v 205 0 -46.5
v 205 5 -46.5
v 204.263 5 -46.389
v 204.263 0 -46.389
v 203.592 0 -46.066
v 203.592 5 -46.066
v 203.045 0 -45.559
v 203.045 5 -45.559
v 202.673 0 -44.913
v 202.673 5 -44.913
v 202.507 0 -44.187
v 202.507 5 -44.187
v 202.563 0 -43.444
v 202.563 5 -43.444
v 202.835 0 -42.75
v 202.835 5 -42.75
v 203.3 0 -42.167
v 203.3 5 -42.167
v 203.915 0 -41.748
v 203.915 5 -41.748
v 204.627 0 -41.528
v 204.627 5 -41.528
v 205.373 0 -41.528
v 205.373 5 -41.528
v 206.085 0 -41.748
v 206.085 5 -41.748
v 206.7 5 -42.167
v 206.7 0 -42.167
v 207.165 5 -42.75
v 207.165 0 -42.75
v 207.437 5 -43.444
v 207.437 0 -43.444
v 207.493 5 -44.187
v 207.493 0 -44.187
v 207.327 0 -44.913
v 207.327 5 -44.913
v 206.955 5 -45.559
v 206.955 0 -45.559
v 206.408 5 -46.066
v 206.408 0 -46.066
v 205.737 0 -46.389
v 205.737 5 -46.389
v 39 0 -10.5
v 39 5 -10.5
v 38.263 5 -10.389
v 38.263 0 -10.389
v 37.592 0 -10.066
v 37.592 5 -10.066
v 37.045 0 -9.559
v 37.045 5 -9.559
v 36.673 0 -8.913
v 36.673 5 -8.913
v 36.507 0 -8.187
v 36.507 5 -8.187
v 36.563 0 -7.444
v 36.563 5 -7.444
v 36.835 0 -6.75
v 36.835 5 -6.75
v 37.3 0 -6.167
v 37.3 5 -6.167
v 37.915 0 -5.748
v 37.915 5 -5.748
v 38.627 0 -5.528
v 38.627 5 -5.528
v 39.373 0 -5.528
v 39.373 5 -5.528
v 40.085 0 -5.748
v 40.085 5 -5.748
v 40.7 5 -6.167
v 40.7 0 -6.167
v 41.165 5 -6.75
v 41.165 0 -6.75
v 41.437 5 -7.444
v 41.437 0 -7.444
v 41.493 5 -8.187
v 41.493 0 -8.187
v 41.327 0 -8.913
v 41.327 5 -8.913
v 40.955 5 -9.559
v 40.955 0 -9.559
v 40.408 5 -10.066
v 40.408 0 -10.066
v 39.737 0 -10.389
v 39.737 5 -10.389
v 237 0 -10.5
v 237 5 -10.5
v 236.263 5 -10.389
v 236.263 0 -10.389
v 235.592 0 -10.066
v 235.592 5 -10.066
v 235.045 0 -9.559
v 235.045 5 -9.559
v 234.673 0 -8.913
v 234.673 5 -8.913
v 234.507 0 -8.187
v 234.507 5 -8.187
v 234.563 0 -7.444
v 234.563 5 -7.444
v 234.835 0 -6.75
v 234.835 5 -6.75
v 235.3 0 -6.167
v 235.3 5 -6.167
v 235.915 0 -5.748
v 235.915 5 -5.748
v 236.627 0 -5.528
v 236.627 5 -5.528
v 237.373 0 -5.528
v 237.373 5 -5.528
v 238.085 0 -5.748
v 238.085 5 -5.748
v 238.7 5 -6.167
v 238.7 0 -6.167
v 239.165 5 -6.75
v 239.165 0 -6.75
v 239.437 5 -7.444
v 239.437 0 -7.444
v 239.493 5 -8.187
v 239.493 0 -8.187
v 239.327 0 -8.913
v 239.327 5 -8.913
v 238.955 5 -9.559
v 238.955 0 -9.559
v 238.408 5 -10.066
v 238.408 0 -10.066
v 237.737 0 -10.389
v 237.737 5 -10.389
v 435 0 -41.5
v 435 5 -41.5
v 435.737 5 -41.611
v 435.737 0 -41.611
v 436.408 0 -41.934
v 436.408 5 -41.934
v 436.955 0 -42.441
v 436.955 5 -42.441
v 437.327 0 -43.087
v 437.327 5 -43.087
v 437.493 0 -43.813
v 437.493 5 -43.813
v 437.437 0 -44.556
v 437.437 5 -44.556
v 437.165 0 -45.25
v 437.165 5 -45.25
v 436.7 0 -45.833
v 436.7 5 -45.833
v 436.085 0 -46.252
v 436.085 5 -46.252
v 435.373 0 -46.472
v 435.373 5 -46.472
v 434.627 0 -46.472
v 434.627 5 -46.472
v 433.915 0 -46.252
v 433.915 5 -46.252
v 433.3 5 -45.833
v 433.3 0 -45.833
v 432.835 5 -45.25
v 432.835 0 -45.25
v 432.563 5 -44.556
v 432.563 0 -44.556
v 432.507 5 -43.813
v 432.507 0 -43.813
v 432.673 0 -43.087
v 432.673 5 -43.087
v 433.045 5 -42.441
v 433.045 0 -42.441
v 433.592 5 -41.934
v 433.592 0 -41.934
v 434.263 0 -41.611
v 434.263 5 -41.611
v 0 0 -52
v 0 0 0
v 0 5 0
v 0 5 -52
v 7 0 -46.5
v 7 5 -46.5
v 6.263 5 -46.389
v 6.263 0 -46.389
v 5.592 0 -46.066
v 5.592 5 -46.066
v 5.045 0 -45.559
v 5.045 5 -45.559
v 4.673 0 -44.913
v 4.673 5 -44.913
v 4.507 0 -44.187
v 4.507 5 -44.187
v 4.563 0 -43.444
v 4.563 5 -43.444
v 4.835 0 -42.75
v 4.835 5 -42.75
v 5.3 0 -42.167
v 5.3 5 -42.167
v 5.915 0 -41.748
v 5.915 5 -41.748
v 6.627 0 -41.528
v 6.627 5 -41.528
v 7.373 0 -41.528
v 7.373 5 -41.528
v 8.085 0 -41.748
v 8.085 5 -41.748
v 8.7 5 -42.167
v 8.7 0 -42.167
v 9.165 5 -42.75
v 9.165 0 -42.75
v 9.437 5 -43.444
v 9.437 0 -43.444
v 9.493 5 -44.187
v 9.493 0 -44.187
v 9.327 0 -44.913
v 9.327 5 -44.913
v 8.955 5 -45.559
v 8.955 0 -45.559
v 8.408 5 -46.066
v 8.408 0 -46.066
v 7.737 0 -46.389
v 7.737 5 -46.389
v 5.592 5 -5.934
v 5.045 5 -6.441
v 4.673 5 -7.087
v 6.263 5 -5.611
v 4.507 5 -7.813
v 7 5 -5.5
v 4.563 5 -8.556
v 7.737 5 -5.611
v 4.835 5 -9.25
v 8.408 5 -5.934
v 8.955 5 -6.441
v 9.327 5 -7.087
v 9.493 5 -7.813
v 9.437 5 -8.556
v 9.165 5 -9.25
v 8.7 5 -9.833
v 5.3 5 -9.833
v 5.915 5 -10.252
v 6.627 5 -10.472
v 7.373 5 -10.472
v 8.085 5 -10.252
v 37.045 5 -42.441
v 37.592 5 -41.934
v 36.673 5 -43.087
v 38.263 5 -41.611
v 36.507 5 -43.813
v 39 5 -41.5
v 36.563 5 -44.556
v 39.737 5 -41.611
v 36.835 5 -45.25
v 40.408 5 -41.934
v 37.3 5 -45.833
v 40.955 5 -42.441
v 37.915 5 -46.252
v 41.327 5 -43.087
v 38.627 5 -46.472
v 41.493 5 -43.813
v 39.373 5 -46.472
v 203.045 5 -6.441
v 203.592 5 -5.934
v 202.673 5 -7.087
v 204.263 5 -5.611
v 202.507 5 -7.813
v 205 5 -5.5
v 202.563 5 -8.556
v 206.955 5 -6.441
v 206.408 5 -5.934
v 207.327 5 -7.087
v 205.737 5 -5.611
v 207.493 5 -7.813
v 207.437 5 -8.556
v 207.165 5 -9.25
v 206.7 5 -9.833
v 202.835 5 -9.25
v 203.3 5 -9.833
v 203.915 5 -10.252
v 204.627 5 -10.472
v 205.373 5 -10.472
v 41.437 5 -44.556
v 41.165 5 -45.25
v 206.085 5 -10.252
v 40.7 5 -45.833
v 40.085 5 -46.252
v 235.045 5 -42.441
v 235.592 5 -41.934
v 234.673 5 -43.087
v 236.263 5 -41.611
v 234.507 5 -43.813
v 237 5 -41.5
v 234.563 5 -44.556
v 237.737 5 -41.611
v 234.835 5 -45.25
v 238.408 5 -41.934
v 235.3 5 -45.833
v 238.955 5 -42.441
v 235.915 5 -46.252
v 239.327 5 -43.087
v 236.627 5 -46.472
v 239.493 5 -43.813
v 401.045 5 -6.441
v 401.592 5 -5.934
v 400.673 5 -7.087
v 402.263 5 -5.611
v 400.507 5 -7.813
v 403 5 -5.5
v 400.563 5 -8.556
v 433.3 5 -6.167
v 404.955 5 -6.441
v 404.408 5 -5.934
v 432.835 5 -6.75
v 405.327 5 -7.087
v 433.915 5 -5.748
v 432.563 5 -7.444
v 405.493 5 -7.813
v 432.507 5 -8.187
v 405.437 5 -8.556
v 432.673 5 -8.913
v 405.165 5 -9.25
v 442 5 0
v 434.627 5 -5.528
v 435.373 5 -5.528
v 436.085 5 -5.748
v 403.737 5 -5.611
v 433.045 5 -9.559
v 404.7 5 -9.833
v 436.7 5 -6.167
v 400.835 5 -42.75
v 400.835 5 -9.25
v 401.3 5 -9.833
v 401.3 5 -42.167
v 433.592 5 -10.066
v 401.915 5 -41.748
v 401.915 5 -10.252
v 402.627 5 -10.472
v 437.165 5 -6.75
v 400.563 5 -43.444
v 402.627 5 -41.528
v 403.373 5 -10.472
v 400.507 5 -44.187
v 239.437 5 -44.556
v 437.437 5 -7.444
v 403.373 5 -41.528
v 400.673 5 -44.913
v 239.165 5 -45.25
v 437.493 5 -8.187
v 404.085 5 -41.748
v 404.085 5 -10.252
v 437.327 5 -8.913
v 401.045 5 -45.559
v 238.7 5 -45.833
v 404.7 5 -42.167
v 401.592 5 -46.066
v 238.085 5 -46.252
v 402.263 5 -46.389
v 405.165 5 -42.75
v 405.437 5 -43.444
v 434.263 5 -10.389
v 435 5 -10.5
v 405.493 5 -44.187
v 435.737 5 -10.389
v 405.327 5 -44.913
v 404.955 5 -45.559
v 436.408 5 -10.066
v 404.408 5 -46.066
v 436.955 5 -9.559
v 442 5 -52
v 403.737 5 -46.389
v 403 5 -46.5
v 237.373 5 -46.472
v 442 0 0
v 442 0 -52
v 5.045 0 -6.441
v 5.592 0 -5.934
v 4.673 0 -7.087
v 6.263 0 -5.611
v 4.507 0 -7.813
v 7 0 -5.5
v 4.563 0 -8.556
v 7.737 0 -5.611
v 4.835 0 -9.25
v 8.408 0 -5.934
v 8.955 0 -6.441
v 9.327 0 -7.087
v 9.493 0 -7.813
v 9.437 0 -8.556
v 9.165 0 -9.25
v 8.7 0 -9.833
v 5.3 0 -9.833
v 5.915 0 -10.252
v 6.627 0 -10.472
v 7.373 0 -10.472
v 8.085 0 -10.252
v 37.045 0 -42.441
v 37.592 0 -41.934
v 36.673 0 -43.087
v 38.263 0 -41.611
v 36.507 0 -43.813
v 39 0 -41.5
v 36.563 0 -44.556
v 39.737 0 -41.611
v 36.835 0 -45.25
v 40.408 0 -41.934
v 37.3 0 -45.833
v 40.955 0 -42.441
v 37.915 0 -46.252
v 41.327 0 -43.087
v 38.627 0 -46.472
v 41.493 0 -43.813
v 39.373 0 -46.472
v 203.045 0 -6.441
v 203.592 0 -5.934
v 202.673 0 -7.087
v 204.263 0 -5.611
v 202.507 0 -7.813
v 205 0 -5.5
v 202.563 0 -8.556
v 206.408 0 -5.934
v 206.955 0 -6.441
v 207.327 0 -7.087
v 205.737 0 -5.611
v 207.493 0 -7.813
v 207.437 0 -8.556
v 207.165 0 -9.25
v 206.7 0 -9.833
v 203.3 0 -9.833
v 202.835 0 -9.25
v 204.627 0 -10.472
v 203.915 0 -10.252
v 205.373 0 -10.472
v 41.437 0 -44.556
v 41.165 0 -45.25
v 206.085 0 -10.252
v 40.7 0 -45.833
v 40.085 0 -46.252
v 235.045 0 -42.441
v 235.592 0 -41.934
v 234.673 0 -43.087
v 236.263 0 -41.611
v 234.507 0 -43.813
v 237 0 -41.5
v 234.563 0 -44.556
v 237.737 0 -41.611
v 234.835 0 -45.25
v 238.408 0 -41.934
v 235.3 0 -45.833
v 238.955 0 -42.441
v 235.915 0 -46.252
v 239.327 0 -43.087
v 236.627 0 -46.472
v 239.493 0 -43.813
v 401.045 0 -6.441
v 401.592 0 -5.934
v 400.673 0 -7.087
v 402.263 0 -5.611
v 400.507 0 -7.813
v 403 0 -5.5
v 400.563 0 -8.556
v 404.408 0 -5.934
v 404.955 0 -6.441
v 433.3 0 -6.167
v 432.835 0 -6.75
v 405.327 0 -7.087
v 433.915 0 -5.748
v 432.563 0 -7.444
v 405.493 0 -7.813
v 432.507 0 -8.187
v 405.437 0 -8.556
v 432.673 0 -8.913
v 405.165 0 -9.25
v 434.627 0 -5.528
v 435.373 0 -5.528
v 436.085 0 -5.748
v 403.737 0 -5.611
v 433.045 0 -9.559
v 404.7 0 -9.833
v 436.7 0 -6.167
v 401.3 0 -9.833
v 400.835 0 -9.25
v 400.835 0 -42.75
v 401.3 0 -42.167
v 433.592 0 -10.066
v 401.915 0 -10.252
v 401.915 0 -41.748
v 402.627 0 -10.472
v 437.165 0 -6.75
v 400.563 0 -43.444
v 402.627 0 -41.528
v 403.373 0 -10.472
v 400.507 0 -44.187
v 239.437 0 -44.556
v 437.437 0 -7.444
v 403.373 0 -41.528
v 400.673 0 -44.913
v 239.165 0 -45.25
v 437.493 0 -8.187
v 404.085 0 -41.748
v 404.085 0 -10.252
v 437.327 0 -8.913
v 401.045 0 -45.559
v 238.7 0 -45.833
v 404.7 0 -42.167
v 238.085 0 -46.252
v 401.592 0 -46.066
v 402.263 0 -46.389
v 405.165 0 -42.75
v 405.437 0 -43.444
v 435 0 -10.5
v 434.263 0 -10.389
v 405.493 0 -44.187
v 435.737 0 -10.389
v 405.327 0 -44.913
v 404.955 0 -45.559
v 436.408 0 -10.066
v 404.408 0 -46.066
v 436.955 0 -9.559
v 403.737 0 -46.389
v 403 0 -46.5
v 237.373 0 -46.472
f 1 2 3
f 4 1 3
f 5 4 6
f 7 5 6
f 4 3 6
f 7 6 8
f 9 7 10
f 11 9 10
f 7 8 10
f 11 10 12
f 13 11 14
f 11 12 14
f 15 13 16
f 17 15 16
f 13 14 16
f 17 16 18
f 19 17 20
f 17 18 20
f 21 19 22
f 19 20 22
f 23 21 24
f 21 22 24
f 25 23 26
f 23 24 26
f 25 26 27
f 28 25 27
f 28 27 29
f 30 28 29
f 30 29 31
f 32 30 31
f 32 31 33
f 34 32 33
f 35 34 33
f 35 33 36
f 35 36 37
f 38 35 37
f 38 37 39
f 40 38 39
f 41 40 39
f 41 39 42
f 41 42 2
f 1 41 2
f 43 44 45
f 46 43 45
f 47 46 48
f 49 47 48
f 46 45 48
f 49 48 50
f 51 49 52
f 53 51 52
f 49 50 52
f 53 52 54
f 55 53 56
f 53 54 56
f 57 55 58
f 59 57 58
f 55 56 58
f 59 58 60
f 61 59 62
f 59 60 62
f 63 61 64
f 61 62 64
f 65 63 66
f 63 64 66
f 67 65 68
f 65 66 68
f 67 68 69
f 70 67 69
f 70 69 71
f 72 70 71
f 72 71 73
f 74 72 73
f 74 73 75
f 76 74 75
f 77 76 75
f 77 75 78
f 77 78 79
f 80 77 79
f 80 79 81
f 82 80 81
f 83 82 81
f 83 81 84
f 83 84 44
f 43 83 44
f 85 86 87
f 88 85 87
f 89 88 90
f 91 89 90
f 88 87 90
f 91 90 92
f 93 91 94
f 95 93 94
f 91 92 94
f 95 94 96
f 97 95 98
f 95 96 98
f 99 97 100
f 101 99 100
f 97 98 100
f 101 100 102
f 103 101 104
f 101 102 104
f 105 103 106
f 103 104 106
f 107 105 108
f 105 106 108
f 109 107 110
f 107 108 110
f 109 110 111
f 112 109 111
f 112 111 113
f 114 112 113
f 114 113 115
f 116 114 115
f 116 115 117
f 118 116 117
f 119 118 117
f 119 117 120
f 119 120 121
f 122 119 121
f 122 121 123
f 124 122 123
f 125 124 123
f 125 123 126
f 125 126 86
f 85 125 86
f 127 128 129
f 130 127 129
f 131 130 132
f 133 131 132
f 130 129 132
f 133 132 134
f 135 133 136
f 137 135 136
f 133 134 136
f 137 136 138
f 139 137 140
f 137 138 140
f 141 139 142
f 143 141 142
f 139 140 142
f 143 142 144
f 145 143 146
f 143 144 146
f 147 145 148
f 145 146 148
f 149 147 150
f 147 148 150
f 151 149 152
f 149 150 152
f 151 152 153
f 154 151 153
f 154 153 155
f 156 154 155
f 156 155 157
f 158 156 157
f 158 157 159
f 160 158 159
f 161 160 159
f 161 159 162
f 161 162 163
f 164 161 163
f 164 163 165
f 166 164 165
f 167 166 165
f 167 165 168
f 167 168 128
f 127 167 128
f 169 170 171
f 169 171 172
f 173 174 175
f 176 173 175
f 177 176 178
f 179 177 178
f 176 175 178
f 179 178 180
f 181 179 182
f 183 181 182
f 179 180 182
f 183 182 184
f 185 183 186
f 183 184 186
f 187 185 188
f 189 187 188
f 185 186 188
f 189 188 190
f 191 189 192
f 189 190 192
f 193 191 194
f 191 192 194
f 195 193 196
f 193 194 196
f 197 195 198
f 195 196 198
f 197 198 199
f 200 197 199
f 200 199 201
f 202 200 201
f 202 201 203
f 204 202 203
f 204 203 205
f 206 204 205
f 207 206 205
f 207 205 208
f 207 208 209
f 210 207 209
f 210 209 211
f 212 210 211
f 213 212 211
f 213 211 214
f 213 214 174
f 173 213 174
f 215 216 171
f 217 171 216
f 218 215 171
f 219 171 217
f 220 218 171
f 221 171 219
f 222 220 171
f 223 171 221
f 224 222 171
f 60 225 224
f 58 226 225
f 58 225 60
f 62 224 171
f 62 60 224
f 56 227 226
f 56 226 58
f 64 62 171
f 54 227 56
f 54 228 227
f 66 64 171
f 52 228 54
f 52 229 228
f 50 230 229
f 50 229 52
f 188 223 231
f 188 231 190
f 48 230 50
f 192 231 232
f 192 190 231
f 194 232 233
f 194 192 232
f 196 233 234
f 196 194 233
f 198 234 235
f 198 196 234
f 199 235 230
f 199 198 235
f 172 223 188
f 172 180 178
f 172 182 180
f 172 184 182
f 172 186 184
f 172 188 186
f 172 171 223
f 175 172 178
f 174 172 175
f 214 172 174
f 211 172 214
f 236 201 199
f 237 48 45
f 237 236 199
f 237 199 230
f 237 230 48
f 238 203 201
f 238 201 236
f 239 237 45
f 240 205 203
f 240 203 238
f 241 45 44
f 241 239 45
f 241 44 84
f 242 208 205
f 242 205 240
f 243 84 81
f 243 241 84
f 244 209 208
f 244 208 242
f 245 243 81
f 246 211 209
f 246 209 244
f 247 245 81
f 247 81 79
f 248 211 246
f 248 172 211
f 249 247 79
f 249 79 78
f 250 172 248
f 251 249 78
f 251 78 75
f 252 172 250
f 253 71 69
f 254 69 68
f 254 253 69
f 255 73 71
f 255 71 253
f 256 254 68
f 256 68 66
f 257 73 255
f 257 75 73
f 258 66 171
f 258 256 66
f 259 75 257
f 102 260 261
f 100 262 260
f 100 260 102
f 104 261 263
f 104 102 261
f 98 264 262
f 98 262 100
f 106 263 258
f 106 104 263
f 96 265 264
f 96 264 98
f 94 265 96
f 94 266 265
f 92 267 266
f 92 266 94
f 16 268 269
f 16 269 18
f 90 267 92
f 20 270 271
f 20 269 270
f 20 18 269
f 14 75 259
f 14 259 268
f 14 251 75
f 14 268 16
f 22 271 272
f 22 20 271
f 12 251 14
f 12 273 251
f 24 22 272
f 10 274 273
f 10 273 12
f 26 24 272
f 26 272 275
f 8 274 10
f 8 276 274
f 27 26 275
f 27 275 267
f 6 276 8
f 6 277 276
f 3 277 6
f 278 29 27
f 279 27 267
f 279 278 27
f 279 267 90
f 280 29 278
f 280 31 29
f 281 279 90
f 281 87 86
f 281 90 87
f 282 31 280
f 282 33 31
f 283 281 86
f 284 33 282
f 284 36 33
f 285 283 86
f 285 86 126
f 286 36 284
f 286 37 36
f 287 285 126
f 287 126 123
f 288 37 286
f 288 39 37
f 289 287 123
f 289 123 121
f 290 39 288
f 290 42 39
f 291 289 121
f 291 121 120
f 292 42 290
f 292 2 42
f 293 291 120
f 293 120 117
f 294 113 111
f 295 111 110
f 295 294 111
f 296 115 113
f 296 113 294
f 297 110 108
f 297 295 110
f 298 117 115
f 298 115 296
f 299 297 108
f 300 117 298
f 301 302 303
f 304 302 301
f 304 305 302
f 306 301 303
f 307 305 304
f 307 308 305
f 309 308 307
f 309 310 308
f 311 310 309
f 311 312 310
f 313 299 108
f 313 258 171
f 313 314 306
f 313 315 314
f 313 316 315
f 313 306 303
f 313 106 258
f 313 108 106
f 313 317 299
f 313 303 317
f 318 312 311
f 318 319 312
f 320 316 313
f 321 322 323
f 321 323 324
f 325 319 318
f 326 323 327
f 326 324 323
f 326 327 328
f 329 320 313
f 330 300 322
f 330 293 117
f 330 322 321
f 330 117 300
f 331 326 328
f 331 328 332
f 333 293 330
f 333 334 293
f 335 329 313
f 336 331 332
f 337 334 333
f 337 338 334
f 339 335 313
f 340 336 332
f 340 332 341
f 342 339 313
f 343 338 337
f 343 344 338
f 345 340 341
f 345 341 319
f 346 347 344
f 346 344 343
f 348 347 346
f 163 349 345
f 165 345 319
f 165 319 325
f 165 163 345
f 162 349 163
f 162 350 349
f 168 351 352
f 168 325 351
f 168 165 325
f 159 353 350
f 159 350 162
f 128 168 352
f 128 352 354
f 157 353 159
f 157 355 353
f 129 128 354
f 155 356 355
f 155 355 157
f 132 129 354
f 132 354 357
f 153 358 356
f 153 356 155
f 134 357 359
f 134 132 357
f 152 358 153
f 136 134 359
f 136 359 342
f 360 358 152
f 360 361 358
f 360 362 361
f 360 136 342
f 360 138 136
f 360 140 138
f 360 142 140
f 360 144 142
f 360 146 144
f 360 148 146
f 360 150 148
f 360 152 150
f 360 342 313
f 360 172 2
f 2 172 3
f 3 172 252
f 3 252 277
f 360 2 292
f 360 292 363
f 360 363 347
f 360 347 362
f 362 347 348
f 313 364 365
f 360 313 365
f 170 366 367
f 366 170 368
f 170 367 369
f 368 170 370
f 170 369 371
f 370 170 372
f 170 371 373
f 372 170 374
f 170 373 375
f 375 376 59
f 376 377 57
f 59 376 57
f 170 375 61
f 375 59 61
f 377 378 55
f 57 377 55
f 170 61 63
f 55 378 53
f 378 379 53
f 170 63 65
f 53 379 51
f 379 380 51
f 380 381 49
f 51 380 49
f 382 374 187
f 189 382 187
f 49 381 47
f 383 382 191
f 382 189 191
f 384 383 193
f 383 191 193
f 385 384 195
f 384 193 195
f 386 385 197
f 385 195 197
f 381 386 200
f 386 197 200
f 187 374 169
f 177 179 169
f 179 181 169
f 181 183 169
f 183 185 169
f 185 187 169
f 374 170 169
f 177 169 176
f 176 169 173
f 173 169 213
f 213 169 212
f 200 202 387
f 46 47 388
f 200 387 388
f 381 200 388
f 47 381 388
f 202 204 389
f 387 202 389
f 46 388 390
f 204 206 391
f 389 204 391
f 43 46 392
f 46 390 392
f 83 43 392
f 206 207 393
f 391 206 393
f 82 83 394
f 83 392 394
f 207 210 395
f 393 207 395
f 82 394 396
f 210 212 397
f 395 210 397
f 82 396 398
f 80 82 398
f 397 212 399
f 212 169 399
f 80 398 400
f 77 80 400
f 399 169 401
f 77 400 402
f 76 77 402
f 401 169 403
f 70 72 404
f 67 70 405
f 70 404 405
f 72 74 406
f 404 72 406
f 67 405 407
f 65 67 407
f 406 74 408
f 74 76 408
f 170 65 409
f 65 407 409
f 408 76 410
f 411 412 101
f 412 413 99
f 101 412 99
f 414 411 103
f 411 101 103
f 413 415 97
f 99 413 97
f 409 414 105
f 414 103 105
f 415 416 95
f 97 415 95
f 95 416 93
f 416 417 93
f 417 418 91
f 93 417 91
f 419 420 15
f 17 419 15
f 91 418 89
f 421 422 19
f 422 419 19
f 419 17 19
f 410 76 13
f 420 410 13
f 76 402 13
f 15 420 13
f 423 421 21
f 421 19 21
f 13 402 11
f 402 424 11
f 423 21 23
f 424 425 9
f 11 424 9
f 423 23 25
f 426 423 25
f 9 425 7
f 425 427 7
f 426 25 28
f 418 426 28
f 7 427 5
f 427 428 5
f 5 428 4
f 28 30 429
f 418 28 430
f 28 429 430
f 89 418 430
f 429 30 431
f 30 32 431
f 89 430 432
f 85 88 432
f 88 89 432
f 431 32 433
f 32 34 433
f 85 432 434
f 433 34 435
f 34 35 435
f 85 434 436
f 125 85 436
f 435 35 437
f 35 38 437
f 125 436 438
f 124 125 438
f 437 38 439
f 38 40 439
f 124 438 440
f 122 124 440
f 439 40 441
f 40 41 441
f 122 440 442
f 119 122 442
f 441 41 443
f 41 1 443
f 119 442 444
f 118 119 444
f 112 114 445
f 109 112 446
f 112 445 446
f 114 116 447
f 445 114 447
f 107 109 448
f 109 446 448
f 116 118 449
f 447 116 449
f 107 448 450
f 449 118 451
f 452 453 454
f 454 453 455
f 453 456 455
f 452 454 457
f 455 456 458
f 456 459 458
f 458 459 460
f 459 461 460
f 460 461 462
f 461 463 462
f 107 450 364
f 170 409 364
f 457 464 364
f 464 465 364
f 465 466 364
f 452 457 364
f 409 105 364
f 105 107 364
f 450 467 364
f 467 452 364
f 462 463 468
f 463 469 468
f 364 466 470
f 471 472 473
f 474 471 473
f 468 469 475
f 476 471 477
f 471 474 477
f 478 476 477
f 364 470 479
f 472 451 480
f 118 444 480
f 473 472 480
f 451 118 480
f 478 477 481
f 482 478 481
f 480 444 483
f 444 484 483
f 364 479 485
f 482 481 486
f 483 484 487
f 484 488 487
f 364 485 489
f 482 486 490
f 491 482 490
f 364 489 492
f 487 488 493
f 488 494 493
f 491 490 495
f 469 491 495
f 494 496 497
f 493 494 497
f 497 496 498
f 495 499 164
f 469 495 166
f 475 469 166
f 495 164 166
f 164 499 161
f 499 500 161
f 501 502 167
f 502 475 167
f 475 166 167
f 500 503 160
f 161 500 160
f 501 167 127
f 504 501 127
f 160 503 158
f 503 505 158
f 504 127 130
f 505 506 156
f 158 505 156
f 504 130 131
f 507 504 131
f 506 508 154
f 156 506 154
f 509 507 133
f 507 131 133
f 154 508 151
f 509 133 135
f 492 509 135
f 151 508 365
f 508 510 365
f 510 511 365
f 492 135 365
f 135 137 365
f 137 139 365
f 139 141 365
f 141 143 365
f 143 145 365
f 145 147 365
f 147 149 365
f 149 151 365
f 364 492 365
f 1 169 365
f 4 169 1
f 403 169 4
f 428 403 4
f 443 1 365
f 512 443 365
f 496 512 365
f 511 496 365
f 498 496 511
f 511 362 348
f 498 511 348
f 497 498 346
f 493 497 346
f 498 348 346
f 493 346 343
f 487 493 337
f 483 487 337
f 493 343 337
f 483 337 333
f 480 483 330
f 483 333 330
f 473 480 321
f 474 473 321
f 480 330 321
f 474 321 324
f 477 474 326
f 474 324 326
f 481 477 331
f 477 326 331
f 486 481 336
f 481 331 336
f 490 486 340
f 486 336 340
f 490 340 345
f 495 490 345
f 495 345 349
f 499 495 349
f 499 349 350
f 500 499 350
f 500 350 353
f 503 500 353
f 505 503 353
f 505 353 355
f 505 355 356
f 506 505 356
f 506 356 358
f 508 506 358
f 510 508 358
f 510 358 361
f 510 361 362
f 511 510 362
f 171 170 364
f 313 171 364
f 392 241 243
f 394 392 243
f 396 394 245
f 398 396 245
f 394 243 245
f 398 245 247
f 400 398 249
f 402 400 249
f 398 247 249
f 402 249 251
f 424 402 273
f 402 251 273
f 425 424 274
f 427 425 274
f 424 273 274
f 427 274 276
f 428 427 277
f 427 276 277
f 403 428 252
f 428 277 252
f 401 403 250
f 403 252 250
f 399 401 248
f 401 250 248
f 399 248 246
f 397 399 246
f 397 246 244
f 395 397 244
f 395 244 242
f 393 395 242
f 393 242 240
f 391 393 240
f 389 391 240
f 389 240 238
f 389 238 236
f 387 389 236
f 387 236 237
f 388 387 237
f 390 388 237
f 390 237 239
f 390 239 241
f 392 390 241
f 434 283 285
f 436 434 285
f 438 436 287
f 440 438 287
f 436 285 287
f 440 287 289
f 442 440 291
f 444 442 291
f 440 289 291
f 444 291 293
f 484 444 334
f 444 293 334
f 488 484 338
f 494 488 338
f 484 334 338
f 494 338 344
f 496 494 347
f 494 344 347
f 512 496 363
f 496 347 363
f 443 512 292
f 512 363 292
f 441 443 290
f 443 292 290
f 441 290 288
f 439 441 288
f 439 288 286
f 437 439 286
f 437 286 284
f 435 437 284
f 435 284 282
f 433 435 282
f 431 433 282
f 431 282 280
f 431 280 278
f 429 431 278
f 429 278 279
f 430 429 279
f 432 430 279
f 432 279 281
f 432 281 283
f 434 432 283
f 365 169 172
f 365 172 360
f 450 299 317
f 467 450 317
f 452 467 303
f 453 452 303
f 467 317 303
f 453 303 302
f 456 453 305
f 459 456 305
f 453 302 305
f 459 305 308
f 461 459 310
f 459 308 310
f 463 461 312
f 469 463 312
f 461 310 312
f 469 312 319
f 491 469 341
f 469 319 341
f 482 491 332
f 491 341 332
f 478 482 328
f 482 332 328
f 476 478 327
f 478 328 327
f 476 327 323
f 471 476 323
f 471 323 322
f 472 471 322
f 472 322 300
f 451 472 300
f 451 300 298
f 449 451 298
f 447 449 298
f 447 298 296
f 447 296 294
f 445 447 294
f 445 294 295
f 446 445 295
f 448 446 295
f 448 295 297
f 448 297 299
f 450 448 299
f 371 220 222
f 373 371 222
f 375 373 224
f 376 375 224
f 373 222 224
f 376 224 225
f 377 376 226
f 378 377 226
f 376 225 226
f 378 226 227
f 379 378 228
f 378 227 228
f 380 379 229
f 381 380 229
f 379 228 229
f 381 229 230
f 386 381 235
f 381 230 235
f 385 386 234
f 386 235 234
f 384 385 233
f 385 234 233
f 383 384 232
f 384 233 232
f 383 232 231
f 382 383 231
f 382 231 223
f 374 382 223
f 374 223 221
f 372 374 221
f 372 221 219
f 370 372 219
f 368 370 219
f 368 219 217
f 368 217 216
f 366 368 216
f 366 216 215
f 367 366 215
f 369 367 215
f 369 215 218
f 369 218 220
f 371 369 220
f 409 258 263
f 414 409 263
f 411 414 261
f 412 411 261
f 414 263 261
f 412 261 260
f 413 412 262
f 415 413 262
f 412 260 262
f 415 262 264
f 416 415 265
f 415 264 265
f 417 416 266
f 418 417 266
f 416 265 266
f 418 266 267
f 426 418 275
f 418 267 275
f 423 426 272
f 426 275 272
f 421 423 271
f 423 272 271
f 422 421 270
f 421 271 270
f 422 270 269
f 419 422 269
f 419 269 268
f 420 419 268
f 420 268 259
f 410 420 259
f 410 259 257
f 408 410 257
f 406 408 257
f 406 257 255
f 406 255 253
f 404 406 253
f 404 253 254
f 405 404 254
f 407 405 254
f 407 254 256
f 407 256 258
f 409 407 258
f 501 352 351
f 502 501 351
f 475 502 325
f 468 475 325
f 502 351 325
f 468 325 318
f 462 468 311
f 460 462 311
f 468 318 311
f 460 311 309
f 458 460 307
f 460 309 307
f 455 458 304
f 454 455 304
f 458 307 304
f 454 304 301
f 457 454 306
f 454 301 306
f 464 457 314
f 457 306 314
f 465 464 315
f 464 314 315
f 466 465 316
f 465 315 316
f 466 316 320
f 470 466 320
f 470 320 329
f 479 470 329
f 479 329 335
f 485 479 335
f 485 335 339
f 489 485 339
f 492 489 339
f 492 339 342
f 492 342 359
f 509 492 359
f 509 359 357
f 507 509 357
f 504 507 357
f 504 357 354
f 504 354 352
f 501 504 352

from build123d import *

# Parameters (mm, degrees)
SKETCH_1_W          = 442
SKETCH_1_H          = 52
EXTRUDE_1_DEPTH     = 5
SKETCH_2_R          = 2.5
CUT_EXTRUDE_1_DEPTH = 446.076397936


with BuildPart() as part:
    # 草图1 → 凸台-拉伸1 (new body)
    with BuildSketch(Plane(origin=(0, 0, 0), x_dir=(1, 0, 0), z_dir=(0, 1, 0))):
        with Locations((221, 26)):
            Rectangle(SKETCH_1_W, SKETCH_1_H)
    extrude(amount=EXTRUDE_1_DEPTH)

    # 草图2 → 切除-拉伸1 (cut, through all)
    with BuildSketch(Plane(origin=(0, 5, 0), x_dir=(1, 0, 0), z_dir=(0, 1, 0))):
        with Locations(Location((205, 8, 0), (0, 0, 270))):
            Circle(SKETCH_2_R)
        with Locations(Location((237, 8, 0), (0, 0, 90))):
            Circle(SKETCH_2_R)
        with Locations(Location((205, 44, 0), (0, 0, 90))):
            Circle(SKETCH_2_R)
        with Locations(Location((237, 44, 0), (0, 0, 270))):
            Circle(SKETCH_2_R)
        with Locations(Location((435, 44, 0), (0, 0, 270))):
            Circle(SKETCH_2_R)
        with Locations(Location((403, 44, 0), (0, 0, 90))):
            Circle(SKETCH_2_R)
        with Locations(Location((403, 8, 0), (0, 0, 270))):
            Circle(SKETCH_2_R)
        with Locations(Location((435, 8, 0), (0, 0, 90))):
            Circle(SKETCH_2_R)
        with Locations(Location((7, 44, 0), (0, 0, 90))):
            Circle(SKETCH_2_R)
        with Locations(Location((39, 44, 0), (0, 0, 270))):
            Circle(SKETCH_2_R)
        with Locations(Location((39, 8, 0), (0, 0, 90))):
            Circle(SKETCH_2_R)
        with Locations(Location((7, 8, 0), (0, 0, 270))):
            Circle(SKETCH_2_R)
    extrude(amount=-CUT_EXTRUDE_1_DEPTH, mode=Mode.SUBTRACT)


solid = part.part
